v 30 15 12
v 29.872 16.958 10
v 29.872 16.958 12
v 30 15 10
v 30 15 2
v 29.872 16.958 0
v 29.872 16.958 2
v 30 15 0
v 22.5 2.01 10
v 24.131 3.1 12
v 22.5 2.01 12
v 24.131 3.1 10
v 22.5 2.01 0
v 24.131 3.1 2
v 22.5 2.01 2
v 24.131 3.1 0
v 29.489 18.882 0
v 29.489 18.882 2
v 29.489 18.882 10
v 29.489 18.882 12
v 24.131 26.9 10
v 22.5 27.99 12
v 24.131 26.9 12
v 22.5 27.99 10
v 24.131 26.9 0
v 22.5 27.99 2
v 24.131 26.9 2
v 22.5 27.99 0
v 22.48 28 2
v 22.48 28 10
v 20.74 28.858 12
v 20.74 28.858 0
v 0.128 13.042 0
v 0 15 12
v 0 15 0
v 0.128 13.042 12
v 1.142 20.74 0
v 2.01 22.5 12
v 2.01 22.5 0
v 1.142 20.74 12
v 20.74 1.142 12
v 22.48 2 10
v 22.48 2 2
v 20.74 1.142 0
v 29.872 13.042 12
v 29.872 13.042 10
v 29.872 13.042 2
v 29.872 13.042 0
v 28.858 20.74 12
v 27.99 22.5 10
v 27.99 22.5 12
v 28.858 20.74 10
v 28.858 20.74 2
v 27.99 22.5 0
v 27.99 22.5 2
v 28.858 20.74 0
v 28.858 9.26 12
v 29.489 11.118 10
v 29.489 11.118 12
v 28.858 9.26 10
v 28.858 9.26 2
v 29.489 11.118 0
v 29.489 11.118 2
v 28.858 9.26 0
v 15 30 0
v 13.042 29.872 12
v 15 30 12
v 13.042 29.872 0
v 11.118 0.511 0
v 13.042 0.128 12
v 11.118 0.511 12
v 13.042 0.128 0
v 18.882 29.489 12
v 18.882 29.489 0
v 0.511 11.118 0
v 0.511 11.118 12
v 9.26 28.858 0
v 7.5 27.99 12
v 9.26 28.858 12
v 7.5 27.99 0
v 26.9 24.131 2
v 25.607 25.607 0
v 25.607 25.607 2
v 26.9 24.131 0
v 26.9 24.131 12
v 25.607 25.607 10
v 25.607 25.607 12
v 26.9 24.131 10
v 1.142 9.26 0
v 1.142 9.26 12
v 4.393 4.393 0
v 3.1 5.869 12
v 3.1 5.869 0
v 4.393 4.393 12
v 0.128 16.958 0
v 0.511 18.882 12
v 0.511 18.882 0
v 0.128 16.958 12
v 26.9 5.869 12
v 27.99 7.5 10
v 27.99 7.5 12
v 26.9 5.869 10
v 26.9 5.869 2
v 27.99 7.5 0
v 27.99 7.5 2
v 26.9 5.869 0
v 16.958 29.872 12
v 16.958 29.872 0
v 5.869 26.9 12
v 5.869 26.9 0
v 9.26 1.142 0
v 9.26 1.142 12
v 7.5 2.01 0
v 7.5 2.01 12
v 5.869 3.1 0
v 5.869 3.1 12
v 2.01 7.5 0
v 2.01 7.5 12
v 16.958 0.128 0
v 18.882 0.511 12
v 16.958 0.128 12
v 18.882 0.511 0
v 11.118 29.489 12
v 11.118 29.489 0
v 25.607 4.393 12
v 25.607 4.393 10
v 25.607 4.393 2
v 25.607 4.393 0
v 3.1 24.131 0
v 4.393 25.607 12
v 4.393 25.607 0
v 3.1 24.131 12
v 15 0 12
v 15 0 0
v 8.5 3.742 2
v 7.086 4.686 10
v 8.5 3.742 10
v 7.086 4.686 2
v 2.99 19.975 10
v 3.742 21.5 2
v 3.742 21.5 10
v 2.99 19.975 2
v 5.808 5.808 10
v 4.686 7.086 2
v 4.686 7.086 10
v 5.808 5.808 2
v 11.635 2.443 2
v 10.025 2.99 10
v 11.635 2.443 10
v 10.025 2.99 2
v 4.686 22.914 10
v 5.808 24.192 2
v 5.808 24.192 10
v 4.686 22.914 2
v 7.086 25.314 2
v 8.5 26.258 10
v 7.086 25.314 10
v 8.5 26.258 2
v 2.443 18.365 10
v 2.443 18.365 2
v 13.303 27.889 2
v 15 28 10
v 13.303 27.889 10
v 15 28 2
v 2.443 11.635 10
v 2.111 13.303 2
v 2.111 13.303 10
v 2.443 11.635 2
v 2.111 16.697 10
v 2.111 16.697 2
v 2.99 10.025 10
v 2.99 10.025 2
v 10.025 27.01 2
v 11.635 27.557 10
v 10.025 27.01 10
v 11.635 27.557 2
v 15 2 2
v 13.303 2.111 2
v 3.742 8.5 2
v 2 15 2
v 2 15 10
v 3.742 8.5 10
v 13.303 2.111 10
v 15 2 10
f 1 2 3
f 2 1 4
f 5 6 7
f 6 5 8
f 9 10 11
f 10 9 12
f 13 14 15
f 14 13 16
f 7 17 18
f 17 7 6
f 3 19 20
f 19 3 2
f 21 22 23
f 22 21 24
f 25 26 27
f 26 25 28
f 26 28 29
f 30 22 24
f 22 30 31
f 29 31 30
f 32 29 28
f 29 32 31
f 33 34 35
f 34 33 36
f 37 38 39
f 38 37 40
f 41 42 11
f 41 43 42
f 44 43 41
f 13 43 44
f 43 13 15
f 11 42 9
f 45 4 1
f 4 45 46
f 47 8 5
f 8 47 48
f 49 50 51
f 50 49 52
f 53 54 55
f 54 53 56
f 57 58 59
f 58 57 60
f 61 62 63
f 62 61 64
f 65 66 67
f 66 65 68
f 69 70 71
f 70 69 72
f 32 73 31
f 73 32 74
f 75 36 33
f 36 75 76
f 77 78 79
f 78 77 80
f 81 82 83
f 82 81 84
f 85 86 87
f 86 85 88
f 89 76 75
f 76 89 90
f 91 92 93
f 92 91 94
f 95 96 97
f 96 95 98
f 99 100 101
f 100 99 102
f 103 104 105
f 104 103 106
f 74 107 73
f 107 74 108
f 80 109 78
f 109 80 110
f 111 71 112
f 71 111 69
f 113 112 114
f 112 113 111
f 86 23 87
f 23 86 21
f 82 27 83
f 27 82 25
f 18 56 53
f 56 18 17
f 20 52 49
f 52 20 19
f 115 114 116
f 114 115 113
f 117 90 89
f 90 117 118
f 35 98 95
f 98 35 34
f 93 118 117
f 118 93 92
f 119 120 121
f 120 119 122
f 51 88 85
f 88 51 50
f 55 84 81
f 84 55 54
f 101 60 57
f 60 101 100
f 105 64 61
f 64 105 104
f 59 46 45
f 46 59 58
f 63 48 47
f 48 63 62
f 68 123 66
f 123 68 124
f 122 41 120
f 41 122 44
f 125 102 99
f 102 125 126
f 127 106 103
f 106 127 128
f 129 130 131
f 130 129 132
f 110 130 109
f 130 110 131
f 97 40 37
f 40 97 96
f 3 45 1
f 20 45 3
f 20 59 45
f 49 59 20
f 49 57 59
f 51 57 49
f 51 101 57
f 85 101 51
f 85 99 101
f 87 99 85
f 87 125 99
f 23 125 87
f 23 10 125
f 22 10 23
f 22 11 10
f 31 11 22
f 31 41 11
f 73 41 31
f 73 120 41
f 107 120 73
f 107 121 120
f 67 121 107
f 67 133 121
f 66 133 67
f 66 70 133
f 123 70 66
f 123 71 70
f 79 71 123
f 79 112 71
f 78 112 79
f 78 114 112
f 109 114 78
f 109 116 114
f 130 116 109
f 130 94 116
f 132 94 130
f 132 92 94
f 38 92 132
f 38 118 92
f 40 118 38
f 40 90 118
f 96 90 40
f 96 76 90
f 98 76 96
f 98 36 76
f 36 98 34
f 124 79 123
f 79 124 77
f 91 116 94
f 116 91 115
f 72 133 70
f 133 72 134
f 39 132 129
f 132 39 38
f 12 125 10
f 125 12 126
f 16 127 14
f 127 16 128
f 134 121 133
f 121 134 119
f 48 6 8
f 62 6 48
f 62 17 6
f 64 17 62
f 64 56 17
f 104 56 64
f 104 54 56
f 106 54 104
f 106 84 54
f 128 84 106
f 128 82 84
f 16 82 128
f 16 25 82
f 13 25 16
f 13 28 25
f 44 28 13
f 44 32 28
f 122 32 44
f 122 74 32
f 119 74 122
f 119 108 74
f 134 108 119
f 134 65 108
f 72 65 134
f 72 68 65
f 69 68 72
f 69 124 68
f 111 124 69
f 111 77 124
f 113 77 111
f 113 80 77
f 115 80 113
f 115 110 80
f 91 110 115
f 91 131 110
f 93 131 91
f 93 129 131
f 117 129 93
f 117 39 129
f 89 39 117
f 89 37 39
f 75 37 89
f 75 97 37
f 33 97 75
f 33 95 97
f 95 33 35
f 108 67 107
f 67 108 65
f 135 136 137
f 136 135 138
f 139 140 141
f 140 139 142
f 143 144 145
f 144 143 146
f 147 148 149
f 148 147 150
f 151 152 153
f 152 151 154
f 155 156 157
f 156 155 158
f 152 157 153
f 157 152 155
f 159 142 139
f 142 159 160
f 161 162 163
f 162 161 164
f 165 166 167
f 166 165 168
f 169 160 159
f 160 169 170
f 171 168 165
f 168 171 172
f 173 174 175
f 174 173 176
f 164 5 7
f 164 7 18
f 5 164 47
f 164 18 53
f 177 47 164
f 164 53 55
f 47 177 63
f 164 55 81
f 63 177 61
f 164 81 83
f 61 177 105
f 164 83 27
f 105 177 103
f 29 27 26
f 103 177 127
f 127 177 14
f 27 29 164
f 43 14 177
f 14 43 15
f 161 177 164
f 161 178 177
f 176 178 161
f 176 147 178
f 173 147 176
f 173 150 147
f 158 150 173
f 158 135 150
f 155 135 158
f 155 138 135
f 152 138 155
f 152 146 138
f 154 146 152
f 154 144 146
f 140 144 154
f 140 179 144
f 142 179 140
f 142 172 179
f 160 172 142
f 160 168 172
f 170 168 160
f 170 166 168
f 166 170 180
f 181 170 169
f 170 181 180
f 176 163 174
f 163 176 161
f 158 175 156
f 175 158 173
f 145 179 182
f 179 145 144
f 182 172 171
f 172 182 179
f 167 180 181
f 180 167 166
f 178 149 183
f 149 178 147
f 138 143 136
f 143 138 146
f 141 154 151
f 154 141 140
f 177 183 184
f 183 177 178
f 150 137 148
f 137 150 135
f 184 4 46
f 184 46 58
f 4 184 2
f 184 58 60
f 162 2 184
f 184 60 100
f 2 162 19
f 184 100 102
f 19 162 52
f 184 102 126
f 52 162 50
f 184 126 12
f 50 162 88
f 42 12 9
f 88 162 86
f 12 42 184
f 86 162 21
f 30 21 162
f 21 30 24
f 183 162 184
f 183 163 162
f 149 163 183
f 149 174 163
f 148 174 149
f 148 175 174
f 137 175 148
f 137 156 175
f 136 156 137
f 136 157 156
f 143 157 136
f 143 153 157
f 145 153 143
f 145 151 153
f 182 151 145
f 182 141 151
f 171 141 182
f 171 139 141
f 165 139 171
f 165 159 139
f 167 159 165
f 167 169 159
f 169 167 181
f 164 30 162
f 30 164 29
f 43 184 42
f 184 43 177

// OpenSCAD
// units=mm — generated by scad_emitter.py
// part=unnamed
$fn = 48;

difference() { translate([15, 15, 0]) cylinder(h=12, r=15, $fn=$fn); translate([15, 15, 2]) cylinder(h=8, r=13, $fn=$fn); translate([15, 2, 2]) cube([15.5, 26, 8]); }
